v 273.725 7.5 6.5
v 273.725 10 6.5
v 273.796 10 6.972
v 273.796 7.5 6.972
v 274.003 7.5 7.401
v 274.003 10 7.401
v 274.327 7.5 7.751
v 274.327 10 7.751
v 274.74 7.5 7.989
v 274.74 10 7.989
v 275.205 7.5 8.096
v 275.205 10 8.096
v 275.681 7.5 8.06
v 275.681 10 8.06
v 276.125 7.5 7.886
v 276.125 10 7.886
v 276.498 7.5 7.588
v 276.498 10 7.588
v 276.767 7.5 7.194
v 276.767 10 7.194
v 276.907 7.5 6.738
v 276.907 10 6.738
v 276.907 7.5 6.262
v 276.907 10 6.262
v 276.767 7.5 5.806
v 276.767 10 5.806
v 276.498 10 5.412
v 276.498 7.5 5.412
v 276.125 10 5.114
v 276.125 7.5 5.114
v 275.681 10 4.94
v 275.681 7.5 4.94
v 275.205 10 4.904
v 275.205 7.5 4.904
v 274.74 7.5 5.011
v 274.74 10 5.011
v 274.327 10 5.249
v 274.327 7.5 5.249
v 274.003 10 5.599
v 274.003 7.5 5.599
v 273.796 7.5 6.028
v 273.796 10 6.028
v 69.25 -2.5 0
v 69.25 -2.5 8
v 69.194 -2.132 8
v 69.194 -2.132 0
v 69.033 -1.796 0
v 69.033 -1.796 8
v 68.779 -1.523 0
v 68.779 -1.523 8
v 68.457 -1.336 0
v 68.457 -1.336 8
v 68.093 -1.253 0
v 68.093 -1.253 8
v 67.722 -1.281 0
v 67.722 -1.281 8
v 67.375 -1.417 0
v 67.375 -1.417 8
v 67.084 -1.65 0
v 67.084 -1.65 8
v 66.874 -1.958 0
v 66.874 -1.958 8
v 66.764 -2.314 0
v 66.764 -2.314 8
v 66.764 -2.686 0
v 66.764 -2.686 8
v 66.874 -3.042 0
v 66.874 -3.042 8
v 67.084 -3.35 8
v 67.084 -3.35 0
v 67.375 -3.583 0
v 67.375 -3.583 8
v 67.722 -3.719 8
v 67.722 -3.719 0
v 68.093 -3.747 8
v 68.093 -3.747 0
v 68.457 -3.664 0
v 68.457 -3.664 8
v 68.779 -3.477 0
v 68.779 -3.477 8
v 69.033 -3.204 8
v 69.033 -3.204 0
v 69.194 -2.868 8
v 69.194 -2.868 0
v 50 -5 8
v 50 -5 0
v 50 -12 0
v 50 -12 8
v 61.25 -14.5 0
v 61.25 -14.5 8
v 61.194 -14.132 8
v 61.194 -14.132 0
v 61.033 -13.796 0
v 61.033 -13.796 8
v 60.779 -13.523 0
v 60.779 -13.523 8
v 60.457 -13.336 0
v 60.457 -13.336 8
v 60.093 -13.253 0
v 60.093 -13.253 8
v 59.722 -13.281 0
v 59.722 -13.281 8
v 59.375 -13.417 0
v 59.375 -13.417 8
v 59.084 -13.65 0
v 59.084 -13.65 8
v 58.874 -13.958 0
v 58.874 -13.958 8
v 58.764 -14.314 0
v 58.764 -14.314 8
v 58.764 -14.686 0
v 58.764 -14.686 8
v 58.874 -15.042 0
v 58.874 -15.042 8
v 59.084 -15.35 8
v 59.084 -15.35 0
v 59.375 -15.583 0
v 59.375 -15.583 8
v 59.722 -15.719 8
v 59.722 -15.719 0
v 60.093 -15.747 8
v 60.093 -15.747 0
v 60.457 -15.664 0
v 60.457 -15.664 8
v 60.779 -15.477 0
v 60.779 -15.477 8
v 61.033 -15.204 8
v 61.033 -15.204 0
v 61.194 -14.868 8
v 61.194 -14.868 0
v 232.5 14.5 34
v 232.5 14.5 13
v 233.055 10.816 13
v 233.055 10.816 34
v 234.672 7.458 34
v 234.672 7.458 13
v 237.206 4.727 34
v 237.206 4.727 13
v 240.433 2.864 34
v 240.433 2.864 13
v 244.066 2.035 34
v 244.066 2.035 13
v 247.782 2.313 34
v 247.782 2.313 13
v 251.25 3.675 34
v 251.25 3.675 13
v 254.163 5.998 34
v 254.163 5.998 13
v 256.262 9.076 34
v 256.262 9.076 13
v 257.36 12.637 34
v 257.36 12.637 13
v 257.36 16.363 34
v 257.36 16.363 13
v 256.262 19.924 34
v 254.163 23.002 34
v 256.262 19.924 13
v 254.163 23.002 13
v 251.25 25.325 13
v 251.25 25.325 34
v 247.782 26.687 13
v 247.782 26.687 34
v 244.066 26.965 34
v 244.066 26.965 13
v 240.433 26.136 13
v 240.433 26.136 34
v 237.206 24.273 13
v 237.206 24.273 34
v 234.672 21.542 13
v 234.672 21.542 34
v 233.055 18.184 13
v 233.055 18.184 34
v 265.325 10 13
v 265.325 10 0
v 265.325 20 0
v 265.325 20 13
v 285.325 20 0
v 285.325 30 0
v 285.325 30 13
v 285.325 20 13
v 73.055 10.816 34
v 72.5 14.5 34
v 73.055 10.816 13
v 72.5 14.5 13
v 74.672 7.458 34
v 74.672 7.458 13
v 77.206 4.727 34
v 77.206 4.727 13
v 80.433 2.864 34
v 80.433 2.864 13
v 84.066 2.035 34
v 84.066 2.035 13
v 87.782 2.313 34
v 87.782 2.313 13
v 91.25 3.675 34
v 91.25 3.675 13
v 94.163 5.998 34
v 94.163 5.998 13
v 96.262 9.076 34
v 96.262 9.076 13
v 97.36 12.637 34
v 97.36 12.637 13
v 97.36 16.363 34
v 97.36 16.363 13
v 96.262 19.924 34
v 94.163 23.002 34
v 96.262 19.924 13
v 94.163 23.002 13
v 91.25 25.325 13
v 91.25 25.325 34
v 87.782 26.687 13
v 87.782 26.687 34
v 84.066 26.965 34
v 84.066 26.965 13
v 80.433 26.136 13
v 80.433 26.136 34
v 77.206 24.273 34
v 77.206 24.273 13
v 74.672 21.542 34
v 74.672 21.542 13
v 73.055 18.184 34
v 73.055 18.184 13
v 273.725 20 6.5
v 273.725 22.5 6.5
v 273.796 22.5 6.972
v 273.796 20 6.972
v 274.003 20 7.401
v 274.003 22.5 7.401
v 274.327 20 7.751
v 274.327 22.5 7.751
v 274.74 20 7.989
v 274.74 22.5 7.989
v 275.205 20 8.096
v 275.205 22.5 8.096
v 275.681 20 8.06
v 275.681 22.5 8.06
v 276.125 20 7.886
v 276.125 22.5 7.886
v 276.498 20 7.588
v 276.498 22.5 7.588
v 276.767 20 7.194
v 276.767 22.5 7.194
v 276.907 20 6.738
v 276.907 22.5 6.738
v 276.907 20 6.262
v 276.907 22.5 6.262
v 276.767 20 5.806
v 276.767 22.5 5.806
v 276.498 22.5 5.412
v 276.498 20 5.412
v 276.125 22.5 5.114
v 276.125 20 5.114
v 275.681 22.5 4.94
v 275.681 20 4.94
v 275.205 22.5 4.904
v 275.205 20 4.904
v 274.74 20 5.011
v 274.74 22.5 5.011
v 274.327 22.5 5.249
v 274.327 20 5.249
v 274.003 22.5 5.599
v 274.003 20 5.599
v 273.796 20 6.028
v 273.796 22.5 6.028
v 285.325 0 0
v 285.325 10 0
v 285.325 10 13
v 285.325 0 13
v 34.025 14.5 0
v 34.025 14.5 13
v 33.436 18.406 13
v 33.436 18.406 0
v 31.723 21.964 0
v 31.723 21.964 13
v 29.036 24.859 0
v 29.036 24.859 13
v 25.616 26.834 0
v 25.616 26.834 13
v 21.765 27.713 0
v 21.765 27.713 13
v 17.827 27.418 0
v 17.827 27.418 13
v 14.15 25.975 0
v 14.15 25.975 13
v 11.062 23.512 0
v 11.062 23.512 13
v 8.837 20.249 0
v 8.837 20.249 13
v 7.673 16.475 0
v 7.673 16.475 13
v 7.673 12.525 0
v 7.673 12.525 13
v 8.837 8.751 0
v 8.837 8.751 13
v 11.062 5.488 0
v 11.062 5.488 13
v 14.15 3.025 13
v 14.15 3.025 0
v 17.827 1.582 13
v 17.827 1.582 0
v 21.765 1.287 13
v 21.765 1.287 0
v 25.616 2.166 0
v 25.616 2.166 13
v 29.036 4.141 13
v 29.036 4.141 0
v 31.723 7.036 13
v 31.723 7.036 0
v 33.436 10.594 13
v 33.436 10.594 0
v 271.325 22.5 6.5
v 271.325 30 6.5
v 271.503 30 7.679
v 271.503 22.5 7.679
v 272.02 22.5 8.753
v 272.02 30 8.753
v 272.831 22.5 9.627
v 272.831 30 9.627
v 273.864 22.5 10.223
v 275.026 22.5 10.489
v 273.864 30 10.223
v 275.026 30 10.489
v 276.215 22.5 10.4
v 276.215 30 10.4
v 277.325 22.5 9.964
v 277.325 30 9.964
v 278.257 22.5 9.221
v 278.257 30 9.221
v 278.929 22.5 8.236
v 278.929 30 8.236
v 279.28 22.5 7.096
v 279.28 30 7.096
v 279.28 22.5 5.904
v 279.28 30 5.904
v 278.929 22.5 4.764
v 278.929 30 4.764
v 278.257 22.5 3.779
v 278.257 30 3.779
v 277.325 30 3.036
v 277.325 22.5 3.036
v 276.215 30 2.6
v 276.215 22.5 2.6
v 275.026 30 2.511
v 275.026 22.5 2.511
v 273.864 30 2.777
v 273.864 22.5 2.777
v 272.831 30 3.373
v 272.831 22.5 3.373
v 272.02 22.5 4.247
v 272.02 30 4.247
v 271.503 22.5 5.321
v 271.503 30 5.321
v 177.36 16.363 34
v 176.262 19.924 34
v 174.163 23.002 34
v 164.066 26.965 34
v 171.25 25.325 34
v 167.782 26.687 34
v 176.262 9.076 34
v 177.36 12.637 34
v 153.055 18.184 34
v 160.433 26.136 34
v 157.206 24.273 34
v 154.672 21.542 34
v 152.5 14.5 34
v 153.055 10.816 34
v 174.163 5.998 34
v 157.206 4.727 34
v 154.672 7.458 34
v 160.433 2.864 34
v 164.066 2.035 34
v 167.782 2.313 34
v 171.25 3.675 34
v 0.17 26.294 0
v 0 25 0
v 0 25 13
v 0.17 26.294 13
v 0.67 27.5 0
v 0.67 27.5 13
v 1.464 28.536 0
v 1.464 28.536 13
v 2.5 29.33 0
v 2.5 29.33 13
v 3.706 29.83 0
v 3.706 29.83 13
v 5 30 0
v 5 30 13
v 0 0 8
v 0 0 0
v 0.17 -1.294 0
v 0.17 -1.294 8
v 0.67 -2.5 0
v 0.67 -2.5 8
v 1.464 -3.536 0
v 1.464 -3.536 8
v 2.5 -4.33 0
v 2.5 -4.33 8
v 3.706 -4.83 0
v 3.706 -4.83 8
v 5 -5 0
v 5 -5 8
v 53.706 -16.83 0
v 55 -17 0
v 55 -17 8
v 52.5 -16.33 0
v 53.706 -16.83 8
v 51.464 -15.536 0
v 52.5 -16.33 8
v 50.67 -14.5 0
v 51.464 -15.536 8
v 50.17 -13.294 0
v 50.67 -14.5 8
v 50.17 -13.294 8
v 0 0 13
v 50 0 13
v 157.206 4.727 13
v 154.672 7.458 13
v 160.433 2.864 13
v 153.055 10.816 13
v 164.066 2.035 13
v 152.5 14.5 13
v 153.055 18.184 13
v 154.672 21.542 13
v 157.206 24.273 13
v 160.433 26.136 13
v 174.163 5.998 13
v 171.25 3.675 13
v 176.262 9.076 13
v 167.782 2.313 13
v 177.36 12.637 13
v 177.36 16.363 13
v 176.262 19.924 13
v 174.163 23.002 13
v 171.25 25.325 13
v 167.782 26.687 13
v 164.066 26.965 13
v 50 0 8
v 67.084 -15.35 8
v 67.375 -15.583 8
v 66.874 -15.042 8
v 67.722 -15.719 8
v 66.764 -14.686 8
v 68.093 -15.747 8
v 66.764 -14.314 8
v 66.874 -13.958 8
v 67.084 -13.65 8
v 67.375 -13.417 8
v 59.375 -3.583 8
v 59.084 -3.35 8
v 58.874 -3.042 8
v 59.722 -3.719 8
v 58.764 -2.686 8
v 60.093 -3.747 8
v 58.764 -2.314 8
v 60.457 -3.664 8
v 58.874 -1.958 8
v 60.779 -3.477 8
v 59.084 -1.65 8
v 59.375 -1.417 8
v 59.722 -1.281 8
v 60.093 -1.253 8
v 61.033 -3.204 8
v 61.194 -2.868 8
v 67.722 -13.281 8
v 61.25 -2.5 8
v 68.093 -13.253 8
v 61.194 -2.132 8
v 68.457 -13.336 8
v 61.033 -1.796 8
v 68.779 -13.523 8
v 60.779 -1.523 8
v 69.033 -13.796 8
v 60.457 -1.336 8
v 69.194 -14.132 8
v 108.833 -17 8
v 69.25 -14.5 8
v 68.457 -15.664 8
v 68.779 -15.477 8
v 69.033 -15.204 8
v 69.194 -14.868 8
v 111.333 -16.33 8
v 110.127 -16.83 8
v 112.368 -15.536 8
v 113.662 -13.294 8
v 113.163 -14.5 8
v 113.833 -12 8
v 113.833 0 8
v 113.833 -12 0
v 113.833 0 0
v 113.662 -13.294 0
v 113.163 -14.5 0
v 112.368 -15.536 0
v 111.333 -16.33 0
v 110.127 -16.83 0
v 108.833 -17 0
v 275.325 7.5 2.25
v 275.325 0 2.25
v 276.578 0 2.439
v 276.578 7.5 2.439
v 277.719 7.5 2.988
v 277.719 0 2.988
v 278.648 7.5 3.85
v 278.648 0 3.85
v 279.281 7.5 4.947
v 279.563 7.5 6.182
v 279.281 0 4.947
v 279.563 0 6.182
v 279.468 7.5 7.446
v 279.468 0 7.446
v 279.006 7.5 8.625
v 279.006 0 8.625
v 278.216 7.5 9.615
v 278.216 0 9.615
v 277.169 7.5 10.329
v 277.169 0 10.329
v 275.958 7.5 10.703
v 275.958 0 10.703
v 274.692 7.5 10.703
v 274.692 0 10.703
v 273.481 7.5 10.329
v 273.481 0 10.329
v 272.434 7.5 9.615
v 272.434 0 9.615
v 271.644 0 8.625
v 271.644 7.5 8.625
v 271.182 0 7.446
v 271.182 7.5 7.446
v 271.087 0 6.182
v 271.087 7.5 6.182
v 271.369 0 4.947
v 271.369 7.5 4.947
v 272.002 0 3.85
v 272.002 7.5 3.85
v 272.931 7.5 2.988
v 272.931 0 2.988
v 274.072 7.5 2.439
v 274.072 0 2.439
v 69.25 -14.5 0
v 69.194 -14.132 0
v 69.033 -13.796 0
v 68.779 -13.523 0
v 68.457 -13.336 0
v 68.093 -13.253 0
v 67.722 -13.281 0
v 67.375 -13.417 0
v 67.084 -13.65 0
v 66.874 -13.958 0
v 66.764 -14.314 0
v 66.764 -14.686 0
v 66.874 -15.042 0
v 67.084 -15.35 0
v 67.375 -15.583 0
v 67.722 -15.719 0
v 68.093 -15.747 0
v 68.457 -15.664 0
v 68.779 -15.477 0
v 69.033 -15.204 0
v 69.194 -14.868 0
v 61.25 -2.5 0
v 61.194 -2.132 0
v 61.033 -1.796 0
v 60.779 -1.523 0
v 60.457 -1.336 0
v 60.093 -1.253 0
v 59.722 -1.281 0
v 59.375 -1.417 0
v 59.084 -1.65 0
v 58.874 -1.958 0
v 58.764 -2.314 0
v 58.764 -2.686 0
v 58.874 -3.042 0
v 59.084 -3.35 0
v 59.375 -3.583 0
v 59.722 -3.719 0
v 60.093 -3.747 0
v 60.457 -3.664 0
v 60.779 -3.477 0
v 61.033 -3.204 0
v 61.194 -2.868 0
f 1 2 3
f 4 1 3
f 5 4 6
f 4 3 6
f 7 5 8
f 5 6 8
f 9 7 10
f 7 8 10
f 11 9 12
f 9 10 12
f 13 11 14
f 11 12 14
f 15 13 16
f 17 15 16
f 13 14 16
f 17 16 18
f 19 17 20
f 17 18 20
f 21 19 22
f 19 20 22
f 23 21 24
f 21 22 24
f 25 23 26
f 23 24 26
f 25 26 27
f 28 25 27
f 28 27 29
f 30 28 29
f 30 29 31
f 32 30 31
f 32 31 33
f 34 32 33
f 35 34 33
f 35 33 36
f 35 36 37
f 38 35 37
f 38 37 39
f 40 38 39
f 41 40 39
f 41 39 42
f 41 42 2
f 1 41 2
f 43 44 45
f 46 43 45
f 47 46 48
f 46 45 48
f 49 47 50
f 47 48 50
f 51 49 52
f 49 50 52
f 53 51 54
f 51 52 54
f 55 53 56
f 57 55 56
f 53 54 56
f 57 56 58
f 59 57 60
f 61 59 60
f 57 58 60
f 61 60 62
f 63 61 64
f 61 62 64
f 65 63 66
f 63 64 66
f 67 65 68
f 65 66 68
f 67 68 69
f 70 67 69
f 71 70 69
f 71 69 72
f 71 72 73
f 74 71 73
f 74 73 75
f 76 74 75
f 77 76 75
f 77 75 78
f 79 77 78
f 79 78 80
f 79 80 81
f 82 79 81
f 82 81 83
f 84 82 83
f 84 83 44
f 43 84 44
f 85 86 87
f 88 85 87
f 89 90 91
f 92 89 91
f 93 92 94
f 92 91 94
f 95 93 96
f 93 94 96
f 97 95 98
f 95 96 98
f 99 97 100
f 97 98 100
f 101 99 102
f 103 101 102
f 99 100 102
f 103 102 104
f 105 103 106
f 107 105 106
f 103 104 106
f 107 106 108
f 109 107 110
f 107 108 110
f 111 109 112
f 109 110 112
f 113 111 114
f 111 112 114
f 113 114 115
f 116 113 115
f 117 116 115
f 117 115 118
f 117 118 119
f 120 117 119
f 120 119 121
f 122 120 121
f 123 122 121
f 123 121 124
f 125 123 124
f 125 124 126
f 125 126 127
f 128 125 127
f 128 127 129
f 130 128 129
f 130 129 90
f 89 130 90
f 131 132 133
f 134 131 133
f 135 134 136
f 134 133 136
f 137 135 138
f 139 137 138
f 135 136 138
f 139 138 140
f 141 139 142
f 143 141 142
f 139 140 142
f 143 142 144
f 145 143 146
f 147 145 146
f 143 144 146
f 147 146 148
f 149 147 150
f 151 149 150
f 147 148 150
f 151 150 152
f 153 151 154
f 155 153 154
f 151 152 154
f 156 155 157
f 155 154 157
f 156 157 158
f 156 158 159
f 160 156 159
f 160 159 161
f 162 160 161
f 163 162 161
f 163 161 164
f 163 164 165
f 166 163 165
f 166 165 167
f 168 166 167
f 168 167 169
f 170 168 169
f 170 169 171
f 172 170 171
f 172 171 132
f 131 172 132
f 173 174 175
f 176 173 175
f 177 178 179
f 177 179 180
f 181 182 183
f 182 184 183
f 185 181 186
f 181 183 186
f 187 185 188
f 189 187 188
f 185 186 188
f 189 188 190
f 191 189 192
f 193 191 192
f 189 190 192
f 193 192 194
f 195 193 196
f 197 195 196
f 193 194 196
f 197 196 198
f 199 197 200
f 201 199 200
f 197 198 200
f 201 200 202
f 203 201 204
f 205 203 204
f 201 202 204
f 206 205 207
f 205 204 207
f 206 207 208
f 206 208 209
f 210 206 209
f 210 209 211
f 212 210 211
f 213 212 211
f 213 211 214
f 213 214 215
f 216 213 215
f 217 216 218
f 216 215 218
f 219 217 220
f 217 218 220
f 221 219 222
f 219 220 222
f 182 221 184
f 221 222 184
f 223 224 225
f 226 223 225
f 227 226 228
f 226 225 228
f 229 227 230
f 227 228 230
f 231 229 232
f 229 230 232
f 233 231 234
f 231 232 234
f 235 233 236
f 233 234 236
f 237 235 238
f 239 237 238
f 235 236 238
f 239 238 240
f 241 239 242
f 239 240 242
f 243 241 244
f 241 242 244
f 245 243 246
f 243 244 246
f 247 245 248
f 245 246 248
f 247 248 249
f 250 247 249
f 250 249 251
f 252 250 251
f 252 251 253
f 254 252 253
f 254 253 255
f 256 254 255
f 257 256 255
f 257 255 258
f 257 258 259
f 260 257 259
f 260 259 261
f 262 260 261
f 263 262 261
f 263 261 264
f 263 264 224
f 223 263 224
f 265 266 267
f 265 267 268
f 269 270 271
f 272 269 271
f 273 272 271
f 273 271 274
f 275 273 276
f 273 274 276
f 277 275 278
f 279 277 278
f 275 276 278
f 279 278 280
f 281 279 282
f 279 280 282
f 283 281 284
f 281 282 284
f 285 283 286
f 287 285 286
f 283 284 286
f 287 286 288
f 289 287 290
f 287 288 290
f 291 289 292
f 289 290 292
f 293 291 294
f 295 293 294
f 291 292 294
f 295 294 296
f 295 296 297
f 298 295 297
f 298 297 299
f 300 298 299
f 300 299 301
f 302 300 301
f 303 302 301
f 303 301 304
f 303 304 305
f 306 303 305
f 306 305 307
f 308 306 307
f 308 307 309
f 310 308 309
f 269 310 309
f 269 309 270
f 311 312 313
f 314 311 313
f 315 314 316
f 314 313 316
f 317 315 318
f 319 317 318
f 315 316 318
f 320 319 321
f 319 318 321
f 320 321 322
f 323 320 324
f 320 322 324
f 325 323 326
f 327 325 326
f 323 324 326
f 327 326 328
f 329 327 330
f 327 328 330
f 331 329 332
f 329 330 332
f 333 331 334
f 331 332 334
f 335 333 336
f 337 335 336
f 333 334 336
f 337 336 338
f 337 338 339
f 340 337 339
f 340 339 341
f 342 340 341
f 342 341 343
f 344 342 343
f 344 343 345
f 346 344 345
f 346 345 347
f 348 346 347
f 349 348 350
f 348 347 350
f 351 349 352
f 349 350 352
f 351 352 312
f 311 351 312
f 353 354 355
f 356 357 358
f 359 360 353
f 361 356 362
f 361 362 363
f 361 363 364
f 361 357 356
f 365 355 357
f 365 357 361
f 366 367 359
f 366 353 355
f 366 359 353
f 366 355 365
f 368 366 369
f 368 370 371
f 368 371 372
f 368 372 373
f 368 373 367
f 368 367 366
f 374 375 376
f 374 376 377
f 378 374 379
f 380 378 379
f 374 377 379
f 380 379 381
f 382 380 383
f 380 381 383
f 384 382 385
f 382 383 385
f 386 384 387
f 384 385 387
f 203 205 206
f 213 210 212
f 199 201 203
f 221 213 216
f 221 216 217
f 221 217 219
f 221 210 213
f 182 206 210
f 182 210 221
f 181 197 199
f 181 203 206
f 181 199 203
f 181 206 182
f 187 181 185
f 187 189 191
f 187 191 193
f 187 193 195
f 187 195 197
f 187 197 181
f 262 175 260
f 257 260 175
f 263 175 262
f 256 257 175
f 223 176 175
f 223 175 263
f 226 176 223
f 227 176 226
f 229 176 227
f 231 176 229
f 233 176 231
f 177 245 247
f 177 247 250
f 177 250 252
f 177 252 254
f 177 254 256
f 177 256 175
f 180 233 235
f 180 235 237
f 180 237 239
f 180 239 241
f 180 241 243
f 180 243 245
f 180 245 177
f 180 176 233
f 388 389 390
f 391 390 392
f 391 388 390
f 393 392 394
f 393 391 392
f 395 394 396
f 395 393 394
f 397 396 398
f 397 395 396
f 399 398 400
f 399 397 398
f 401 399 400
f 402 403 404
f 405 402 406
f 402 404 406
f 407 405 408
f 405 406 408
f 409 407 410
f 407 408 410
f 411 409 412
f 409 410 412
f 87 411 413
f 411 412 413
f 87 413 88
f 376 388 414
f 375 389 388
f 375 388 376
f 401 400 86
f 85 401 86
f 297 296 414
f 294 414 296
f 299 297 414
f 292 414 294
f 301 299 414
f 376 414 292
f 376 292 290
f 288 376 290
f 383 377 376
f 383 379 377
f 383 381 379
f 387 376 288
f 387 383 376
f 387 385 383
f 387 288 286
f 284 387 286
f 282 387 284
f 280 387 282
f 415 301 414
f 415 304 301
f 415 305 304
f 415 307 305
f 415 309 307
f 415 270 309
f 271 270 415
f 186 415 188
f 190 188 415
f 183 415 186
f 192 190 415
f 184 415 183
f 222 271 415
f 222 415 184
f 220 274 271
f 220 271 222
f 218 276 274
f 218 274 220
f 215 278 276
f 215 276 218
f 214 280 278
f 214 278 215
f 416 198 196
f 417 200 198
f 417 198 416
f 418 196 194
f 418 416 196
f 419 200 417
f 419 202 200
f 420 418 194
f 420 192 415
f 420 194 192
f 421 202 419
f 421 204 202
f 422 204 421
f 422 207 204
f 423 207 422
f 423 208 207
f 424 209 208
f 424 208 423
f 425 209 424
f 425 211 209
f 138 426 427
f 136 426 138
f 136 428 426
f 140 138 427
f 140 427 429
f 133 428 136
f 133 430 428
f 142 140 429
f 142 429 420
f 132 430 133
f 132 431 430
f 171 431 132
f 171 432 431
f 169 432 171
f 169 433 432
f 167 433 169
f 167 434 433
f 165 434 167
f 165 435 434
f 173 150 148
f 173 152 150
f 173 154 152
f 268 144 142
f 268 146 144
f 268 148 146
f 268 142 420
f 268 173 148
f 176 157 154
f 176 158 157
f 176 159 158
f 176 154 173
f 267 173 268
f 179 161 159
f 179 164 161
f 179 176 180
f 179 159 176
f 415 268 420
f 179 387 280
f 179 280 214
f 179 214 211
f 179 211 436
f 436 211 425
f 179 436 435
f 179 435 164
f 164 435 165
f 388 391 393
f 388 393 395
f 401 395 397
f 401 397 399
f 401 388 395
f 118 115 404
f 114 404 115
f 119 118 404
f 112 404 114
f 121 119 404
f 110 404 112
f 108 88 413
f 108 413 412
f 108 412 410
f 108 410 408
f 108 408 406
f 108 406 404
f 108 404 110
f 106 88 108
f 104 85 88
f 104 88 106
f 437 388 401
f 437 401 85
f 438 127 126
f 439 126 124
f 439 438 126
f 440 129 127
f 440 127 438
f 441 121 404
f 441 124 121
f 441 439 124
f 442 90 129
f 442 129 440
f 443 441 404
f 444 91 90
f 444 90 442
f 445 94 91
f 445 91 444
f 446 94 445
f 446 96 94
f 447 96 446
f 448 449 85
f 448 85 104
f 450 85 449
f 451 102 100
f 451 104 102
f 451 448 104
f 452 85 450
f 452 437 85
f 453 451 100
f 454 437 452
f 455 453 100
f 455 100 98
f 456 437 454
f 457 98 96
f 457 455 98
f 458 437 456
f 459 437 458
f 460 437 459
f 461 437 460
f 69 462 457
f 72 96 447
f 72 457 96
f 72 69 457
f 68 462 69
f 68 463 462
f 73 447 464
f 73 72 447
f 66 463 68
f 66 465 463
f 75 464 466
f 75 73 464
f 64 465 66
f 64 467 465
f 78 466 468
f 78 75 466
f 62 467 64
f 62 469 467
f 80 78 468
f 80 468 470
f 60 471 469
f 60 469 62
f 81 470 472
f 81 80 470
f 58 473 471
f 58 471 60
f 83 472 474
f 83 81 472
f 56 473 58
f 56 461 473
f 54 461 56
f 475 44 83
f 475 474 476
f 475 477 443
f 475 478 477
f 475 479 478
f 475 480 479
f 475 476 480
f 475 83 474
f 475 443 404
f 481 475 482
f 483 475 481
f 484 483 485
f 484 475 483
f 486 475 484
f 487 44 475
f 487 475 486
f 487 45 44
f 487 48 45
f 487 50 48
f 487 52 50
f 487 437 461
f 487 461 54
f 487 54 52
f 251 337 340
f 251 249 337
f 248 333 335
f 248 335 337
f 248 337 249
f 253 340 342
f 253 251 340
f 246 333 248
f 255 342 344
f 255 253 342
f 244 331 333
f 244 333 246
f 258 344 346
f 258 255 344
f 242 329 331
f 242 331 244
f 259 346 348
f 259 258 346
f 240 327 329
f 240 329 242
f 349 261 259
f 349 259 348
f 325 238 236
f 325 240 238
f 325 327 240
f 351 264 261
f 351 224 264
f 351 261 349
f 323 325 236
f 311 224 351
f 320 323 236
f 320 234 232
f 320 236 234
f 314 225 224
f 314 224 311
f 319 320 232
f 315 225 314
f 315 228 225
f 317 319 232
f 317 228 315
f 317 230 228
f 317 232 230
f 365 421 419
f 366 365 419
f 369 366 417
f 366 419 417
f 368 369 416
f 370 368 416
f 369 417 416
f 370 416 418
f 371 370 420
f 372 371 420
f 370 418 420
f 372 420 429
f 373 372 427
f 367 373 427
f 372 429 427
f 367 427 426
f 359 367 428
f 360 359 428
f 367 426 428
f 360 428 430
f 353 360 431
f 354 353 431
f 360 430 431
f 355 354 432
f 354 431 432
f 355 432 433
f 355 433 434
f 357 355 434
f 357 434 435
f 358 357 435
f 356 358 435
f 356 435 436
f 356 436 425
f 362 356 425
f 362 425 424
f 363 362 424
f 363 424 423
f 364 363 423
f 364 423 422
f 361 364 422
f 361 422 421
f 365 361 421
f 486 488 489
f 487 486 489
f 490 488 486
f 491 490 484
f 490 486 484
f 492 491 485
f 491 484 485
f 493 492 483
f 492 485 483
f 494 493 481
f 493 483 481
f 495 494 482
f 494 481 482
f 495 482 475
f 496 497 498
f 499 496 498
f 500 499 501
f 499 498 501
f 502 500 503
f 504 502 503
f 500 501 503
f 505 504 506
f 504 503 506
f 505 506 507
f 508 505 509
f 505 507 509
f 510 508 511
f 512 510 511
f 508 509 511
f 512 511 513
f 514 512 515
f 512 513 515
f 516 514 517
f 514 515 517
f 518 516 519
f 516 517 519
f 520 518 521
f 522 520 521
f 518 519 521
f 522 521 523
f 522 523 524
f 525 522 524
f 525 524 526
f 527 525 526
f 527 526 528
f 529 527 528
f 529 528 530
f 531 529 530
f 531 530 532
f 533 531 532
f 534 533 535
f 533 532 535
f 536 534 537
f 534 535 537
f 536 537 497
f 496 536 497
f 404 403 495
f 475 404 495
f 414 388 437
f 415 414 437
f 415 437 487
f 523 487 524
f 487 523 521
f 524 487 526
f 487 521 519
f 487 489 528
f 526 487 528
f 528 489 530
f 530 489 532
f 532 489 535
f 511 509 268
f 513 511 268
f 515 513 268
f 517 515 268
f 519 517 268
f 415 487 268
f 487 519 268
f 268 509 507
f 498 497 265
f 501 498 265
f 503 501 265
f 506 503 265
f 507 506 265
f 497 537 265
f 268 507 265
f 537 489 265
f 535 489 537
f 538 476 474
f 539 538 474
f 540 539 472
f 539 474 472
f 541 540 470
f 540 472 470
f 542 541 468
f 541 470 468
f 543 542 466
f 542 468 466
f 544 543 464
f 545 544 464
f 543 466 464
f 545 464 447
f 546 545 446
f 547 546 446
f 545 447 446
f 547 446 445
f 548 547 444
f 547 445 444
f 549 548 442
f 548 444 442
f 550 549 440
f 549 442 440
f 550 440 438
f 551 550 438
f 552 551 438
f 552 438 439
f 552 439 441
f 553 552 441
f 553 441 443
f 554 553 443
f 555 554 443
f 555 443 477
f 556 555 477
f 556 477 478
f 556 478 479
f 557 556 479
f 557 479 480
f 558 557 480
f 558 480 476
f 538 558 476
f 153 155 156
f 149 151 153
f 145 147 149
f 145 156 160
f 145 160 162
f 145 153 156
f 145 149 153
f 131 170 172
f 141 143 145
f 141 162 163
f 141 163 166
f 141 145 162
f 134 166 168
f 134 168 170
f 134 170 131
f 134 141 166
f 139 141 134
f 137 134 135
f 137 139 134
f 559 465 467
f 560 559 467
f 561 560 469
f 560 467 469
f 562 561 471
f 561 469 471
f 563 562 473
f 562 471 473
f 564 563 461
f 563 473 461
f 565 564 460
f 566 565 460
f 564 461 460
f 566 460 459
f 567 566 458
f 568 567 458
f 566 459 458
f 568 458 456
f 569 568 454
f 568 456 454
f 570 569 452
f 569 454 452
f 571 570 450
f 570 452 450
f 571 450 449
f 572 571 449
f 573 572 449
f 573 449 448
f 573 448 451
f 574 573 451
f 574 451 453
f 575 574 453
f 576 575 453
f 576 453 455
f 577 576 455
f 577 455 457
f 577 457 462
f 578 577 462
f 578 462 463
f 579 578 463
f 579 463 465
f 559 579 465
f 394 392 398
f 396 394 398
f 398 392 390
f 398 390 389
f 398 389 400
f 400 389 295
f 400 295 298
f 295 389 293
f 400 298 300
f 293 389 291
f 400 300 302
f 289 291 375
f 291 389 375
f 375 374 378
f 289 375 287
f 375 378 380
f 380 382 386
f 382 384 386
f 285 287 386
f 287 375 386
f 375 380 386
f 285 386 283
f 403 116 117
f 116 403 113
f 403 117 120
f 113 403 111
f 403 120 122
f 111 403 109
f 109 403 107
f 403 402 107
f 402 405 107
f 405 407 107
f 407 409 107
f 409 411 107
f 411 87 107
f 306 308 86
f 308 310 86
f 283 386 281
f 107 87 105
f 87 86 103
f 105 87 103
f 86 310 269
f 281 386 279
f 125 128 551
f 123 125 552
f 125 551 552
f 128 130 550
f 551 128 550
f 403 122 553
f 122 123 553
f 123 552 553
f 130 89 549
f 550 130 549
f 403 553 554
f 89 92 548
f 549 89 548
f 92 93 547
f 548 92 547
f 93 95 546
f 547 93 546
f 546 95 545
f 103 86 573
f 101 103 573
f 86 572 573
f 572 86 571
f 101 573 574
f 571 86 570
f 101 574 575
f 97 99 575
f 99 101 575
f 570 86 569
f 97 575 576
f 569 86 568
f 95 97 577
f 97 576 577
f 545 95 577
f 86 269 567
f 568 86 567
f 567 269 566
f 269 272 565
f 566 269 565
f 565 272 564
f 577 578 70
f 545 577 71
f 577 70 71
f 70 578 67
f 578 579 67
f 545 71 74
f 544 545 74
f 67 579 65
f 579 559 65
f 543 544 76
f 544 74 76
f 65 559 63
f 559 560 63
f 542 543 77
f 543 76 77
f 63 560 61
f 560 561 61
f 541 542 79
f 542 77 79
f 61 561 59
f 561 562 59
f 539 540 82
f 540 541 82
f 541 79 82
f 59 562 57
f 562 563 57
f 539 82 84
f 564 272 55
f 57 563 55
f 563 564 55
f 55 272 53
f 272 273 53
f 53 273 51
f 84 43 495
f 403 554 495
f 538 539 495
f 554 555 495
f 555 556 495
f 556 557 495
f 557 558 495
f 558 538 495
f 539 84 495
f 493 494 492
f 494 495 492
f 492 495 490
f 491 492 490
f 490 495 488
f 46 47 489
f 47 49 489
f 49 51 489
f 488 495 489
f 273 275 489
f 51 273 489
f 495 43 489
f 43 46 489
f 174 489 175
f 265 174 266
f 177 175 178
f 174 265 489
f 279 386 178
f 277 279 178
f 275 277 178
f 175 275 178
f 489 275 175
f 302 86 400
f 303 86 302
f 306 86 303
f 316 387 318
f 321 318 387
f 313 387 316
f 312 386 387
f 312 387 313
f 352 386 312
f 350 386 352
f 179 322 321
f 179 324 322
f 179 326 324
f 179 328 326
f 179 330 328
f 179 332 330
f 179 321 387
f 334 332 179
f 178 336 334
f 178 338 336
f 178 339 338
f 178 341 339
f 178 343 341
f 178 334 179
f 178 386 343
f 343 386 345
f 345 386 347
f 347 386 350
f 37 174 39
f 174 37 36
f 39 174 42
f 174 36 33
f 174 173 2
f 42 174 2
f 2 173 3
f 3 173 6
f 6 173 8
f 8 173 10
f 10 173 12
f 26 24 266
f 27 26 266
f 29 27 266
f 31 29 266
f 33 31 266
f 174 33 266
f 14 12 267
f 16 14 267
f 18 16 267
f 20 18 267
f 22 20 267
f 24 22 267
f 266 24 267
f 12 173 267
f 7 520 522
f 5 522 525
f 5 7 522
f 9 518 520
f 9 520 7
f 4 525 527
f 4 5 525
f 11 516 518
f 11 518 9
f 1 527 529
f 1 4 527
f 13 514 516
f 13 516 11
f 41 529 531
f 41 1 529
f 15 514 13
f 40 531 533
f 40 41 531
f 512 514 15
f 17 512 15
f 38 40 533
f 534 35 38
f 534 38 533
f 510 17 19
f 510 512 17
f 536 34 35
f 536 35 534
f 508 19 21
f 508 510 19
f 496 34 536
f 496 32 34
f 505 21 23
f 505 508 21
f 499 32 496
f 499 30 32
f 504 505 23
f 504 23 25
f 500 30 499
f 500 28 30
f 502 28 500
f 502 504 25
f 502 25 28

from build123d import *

# Parameters (mm, degrees)
SKETCH1_W           = 355.325
SKETCH1_H           = 30
SKETCH1_R           = 12.5
SKETCH1_R_2         = 1
SKETCH1_W_2         = 50
SKETCH1_H_2         = 5
BOSS_EXTRUDE3_DEPTH = 13
FILLET3_R           = 5
SKETCH3_R           = 12.5
BOSS_EXTRUDE4_DEPTH = 13
CUT_EXTRUDE1_REACH  = 359.536
SKETCH4_R           = 1.425
SKETCH5_W           = 63.83
SKETCH5_H           = 18
CUT_EXTRUDE3_DEPTH  = 358.535810269
FILLET4_R           = 5
SKETCH6_W           = 63.8325
SKETCH6_H           = 17
CUT_EXTRUDE4_DEPTH  = 5
SKETCH7_R           = 2.159563788
SKETCH7_R_2         = 1
SKETCH7_R_3         = 2.117135705
SKETCH7_R_4         = 1.916104153
SKETCH7_R_5         = 2.415941568
BOSS_EXTRUDE5_DEPTH = 8
SKETCH8_R           = 12.5
BOSS_EXTRUDE6_DEPTH = 13
SKETCH10_W          = 20
SKETCH10_H          = 10
SKETCH10_R          = 12.5
CUT_EXTRUDE6_DEPTH  = 358.535810269
SKETCH11_R          = 13.25
CUT_EXTRUDE7_DEPTH  = 289.073524686
SKETCH12_R          = 1.25
CUT_EXTRUDE8_DEPTH  = 289.567766088
SKETCH15_R          = 1.6
CUT_EXTRUDE10_DEPTH = 292.788203368
SKETCH17_R          = 4
CUT_EXTRUDE11_DEPTH = 7.5
SKETCH18_R          = 4.25
CUT_EXTRUDE12_DEPTH = 7.5
SKETCH19_W          = 52.537451678
SKETCH19_H          = 17.901984435
CUT_EXTRUDE13_DEPTH = 5
CUT_EXTRUDE14_START = -5
SKETCH20_R          = 12.5
CUT_EXTRUDE14_DEPTH = 5


with BuildPart() as part:
    # Sketch1 → Boss-Extrude3 (new body)
    # profile 1 of 3: a face of its own
    with BuildSketch(Plane.XY):
        with Locations((177.6625, 15)):
            Rectangle(SKETCH1_W, SKETCH1_H)
        with Locations(Location((334.55, 14.5, 0), (0, 0, 180))):
            Circle(SKETCH1_R, mode=Mode.SUBTRACT)
        with Locations(Location((20.775, 14.5, 0), (0, 0, 180))):
            Circle(SKETCH1_R, mode=Mode.SUBTRACT)
    # profile 2 of 3: a face of its own
    with BuildSketch(Plane.XY):
        Polygon((177.6625, 0), (50, 0), (50, -5), (50, -17), (177.6625, -17), align=None)
        with Locations(Location((60, -14.5, 0), (0, 0, 180))):
            Circle(SKETCH1_R_2, mode=Mode.SUBTRACT)
        with Locations(Location((68, -14.5, 0), (0, 0, 180))):
            Circle(SKETCH1_R_2, mode=Mode.SUBTRACT)
        with Locations(Location((60, -2.5, 0), (0, 0, 180))):
            Circle(SKETCH1_R_2, mode=Mode.SUBTRACT)
        with Locations(Location((68, -2.5, 0), (0, 0, 180))):
            Circle(SKETCH1_R_2, mode=Mode.SUBTRACT)
    # profile 3 of 3: a face of its own
    with BuildSketch(Plane.XY):
        with Locations((25, -2.5)):
            Rectangle(SKETCH1_W_2, SKETCH1_H_2)
    extrude(amount=BOSS_EXTRUDE3_DEPTH)

    # Fillet3
    fillet3_edges = [part.edges().sort_by_distance(p)[0] for p in [
        (0, -5, 6.5),
        (0, 30, 6.5),
        (355.325, 30, 6.5),
        (355.325, 0, 6.5),
        (177.6625, -17, 6.5),
        (50, -17, 6.5),
    ]]
    fillet(fillet3_edges, radius=FILLET3_R)

    # Sketch3 → Boss-Extrude4 (add)
    with BuildSketch(Plane.XY.offset(13)):
        with Locations(Location((85, 14.5, 0), (0, 0, 180))):
            Circle(SKETCH3_R)
        with Locations(Location((165, 14.5, 0), (0, 0, 180))):
            Circle(SKETCH3_R)
        with Locations(Location((245, 14.5, 0), (0, 0, 180))):
            Circle(SKETCH3_R)
    extrude(amount=BOSS_EXTRUDE4_DEPTH)

    # Sketch4 → Cut-Extrude1 (cut, up to next)
    with BuildSketch(Plane(origin=(0, 0, 0), x_dir=(-1, 0, 0), z_dir=(0, 0, -1)), mode=Mode.PRIVATE) as cut_extrude1_sk1:
        with Locations((-68, -2.5)):
            Circle(SKETCH4_R)
    cut_extrude1_tool1 = extrude(cut_extrude1_sk1.sketch, amount=-CUT_EXTRUDE1_REACH, mode=Mode.PRIVATE) & part.part
    # Sketch4 → Cut-Extrude1 (cut, up to next)
    with BuildSketch(Plane(origin=(0, 0, 0), x_dir=(-1, 0, 0), z_dir=(0, 0, -1)), mode=Mode.PRIVATE) as cut_extrude1_sk2:
        with Locations((-60, -2.5)):
            Circle(SKETCH4_R)
    cut_extrude1_tool2 = extrude(cut_extrude1_sk2.sketch, amount=-CUT_EXTRUDE1_REACH, mode=Mode.PRIVATE) & part.part
    # Sketch4 → Cut-Extrude1 (cut, up to next)
    with BuildSketch(Plane(origin=(0, 0, 0), x_dir=(-1, 0, 0), z_dir=(0, 0, -1)), mode=Mode.PRIVATE) as cut_extrude1_sk3:
        with Locations((-60, -14.5)):
            Circle(SKETCH4_R)
    cut_extrude1_tool3 = extrude(cut_extrude1_sk3.sketch, amount=-CUT_EXTRUDE1_REACH, mode=Mode.PRIVATE) & part.part
    # Sketch4 → Cut-Extrude1 (cut, up to next)
    with BuildSketch(Plane(origin=(0, 0, 0), x_dir=(-1, 0, 0), z_dir=(0, 0, -1)), mode=Mode.PRIVATE) as cut_extrude1_sk4:
        with Locations((-68, -14.5)):
            Circle(SKETCH4_R)
    cut_extrude1_tool4 = extrude(cut_extrude1_sk4.sketch, amount=-CUT_EXTRUDE1_REACH, mode=Mode.PRIVATE) & part.part
    add(cut_extrude1_tool1.solids().sort_by_distance((68, -2.5, 0))[0], mode=Mode.SUBTRACT)
    add(cut_extrude1_tool2.solids().sort_by_distance((60, -2.5, 0))[0], mode=Mode.SUBTRACT)
    add(cut_extrude1_tool3.solids().sort_by_distance((60, -14.5, 0))[0], mode=Mode.SUBTRACT)
    add(cut_extrude1_tool4.solids().sort_by_distance((68, -14.5, 0))[0], mode=Mode.SUBTRACT)

    # Sketch5 → Cut-Extrude3 (cut, through all)
    with BuildSketch(Plane(origin=(0, 0, 0), x_dir=(-1, 0, 0), z_dir=(0, 0, -1))):
        with Locations((-145.7475, -9)):
            Rectangle(SKETCH5_W, SKETCH5_H)
    extrude(amount=-CUT_EXTRUDE3_DEPTH, mode=Mode.SUBTRACT)

    # Fillet4
    fillet4_edges = [part.edges().sort_by_distance(p)[0] for p in [
        (113.8325, -17, 6.5),
    ]]
    fillet(fillet4_edges, radius=FILLET4_R)

    # Sketch6 → Cut-Extrude4 (cut)
    with BuildSketch(Plane.XY.offset(13)):
        with Locations((81.91625, -8.5)):
            Rectangle(SKETCH6_W, SKETCH6_H)
    extrude(amount=-CUT_EXTRUDE4_DEPTH, mode=Mode.SUBTRACT)

    # Sketch7 → Boss-Extrude5 (add)
    # profile 1 of 4: a face of its own
    with BuildSketch(Plane.XY.offset(8)):
        with Locations((60, -14.5)):
            Circle(SKETCH7_R)
        with Locations((60, -14.5)):
            Circle(SKETCH7_R_2, mode=Mode.SUBTRACT)
    # profile 2 of 4: a face of its own
    with BuildSketch(Plane.XY.offset(8)):
        with Locations((60, -2.5)):
            Circle(SKETCH7_R_3)
        with Locations((60, -2.5)):
            Circle(SKETCH7_R_2, mode=Mode.SUBTRACT)
    # profile 3 of 4: a face of its own
    with BuildSketch(Plane.XY.offset(8)):
        with Locations((68, -2.5)):
            Circle(SKETCH7_R_4)
        with Locations((68, -2.5)):
            Circle(SKETCH7_R_2, mode=Mode.SUBTRACT)
    # profile 4 of 4: a face of its own
    with BuildSketch(Plane.XY.offset(8)):
        with Locations((68, -14.5)):
            Circle(SKETCH7_R_5)
        with Locations((68, -14.5)):
            Circle(SKETCH7_R_2, mode=Mode.SUBTRACT)
    extrude(amount=-BOSS_EXTRUDE5_DEPTH)

    # Sketch8 → Boss-Extrude6 (add)
    with BuildSketch(Plane.XY.offset(26)):
        with Locations(Location((85, 14.5, 0), (0, 0, 180))):
            Circle(SKETCH8_R)
        with Locations(Location((165, 14.5, 0), (0, 0, 180))):
            Circle(SKETCH8_R)
        with Locations(Location((245, 14.5, 0), (0, 0, 180))):
            Circle(SKETCH8_R)
    extrude(amount=BOSS_EXTRUDE6_DEPTH)

    # Sketch10 → Cut-Extrude6 (cut, through all)
    # profile 1 of 2: a face of its own
    with BuildSketch(Plane.XY.offset(13)):
        with Locations((275.325, 15)):
            Rectangle(SKETCH10_W, SKETCH10_H)
    # profile 2 of 2: a face of its own
    with BuildSketch(Plane.XY.offset(13)):
        with BuildLine():
            ThreePointArc((355.325, 25), (353.860533906, 28.535533906), (350.325, 30))
            Line((350.325, 30), (285.325, 30))
            Line((285.325, 30), (285.325, 20))
            Line((285.325, 20), (285.325, 10))
            Line((285.325, 10), (285.325, 0))
            Line((285.325, 0), (350.325, 0))
            ThreePointArc((350.325, 0), (353.860533906, 1.464466094), (355.325, 5))
            Line((355.325, 5), (355.325, 25))
        make_face()
        with Locations((334.55, 14.5)):
            Circle(SKETCH10_R, mode=Mode.SUBTRACT)
    extrude(amount=-CUT_EXTRUDE6_DEPTH, mode=Mode.SUBTRACT)

    # Sketch11 → Cut-Extrude7 (cut, through all)
    with BuildSketch(Plane.XY.offset(13)):
        with Locations((20.775, 14.5)):
            Circle(SKETCH11_R)
    extrude(amount=-CUT_EXTRUDE7_DEPTH, mode=Mode.SUBTRACT)

    # Sketch12 → Cut-Extrude8 (cut, through all)
    with BuildSketch(Plane.XY.offset(8)):
        with Locations((60, -2.5)):
            Circle(SKETCH12_R)
        with Locations((68, -2.5)):
            Circle(SKETCH12_R)
        with Locations((68, -14.5)):
            Circle(SKETCH12_R)
        with Locations((60, -14.5)):
            Circle(SKETCH12_R)
    extrude(amount=-CUT_EXTRUDE8_DEPTH, mode=Mode.SUBTRACT)

    # Sketch15 → Cut-Extrude10 (cut, through all)
    with BuildSketch(Plane(origin=(0, 30, 0), x_dir=(1, 0, 0), z_dir=(0, 1, 0))):
        with Locations(Location((275.325, -6.5, 0), (0, 0, 180))):
            Circle(SKETCH15_R)
    extrude(amount=-CUT_EXTRUDE10_DEPTH, mode=Mode.SUBTRACT)

    # Sketch17 → Cut-Extrude11 (cut)
    with BuildSketch(Plane(origin=(0, 30, 0), x_dir=(1, 0, 0), z_dir=(0, 1, 0))):
        with Locations(Location((275.325, -6.5, 0), (0, 0, 180))):
            Circle(SKETCH17_R)
    extrude(amount=-CUT_EXTRUDE11_DEPTH, mode=Mode.SUBTRACT)

    # Sketch18 → Cut-Extrude12 (cut)
    with BuildSketch(Plane.XZ):
        with Locations(Location((275.325, 6.5, 0), (0, 0, 270))):
            Circle(SKETCH18_R)
    extrude(amount=-CUT_EXTRUDE12_DEPTH, mode=Mode.SUBTRACT)

    # Sketch19 → Cut-Extrude13 (cut)
    with BuildSketch(Plane.XY.offset(13)):
        with Locations((23.731274161, -8.950992218)):
            Rectangle(SKETCH19_W, SKETCH19_H)
    extrude(amount=-CUT_EXTRUDE13_DEPTH, mode=Mode.SUBTRACT)

    # Sketch20 → Cut-Extrude14 (cut)
    with BuildSketch(Plane.XY.offset(39).offset(CUT_EXTRUDE14_START)):
        with Locations(Location((85, 14.5, 0), (0, 0, 180))):
            Circle(SKETCH20_R)
        with Locations(Location((165, 14.5, 0), (0, 0, 180))):
            Circle(SKETCH20_R)
        with Locations(Location((245, 14.5, 0), (0, 0, 180))):
            Circle(SKETCH20_R)
    extrude(amount=CUT_EXTRUDE14_DEPTH, mode=Mode.SUBTRACT)


solid = part.part
